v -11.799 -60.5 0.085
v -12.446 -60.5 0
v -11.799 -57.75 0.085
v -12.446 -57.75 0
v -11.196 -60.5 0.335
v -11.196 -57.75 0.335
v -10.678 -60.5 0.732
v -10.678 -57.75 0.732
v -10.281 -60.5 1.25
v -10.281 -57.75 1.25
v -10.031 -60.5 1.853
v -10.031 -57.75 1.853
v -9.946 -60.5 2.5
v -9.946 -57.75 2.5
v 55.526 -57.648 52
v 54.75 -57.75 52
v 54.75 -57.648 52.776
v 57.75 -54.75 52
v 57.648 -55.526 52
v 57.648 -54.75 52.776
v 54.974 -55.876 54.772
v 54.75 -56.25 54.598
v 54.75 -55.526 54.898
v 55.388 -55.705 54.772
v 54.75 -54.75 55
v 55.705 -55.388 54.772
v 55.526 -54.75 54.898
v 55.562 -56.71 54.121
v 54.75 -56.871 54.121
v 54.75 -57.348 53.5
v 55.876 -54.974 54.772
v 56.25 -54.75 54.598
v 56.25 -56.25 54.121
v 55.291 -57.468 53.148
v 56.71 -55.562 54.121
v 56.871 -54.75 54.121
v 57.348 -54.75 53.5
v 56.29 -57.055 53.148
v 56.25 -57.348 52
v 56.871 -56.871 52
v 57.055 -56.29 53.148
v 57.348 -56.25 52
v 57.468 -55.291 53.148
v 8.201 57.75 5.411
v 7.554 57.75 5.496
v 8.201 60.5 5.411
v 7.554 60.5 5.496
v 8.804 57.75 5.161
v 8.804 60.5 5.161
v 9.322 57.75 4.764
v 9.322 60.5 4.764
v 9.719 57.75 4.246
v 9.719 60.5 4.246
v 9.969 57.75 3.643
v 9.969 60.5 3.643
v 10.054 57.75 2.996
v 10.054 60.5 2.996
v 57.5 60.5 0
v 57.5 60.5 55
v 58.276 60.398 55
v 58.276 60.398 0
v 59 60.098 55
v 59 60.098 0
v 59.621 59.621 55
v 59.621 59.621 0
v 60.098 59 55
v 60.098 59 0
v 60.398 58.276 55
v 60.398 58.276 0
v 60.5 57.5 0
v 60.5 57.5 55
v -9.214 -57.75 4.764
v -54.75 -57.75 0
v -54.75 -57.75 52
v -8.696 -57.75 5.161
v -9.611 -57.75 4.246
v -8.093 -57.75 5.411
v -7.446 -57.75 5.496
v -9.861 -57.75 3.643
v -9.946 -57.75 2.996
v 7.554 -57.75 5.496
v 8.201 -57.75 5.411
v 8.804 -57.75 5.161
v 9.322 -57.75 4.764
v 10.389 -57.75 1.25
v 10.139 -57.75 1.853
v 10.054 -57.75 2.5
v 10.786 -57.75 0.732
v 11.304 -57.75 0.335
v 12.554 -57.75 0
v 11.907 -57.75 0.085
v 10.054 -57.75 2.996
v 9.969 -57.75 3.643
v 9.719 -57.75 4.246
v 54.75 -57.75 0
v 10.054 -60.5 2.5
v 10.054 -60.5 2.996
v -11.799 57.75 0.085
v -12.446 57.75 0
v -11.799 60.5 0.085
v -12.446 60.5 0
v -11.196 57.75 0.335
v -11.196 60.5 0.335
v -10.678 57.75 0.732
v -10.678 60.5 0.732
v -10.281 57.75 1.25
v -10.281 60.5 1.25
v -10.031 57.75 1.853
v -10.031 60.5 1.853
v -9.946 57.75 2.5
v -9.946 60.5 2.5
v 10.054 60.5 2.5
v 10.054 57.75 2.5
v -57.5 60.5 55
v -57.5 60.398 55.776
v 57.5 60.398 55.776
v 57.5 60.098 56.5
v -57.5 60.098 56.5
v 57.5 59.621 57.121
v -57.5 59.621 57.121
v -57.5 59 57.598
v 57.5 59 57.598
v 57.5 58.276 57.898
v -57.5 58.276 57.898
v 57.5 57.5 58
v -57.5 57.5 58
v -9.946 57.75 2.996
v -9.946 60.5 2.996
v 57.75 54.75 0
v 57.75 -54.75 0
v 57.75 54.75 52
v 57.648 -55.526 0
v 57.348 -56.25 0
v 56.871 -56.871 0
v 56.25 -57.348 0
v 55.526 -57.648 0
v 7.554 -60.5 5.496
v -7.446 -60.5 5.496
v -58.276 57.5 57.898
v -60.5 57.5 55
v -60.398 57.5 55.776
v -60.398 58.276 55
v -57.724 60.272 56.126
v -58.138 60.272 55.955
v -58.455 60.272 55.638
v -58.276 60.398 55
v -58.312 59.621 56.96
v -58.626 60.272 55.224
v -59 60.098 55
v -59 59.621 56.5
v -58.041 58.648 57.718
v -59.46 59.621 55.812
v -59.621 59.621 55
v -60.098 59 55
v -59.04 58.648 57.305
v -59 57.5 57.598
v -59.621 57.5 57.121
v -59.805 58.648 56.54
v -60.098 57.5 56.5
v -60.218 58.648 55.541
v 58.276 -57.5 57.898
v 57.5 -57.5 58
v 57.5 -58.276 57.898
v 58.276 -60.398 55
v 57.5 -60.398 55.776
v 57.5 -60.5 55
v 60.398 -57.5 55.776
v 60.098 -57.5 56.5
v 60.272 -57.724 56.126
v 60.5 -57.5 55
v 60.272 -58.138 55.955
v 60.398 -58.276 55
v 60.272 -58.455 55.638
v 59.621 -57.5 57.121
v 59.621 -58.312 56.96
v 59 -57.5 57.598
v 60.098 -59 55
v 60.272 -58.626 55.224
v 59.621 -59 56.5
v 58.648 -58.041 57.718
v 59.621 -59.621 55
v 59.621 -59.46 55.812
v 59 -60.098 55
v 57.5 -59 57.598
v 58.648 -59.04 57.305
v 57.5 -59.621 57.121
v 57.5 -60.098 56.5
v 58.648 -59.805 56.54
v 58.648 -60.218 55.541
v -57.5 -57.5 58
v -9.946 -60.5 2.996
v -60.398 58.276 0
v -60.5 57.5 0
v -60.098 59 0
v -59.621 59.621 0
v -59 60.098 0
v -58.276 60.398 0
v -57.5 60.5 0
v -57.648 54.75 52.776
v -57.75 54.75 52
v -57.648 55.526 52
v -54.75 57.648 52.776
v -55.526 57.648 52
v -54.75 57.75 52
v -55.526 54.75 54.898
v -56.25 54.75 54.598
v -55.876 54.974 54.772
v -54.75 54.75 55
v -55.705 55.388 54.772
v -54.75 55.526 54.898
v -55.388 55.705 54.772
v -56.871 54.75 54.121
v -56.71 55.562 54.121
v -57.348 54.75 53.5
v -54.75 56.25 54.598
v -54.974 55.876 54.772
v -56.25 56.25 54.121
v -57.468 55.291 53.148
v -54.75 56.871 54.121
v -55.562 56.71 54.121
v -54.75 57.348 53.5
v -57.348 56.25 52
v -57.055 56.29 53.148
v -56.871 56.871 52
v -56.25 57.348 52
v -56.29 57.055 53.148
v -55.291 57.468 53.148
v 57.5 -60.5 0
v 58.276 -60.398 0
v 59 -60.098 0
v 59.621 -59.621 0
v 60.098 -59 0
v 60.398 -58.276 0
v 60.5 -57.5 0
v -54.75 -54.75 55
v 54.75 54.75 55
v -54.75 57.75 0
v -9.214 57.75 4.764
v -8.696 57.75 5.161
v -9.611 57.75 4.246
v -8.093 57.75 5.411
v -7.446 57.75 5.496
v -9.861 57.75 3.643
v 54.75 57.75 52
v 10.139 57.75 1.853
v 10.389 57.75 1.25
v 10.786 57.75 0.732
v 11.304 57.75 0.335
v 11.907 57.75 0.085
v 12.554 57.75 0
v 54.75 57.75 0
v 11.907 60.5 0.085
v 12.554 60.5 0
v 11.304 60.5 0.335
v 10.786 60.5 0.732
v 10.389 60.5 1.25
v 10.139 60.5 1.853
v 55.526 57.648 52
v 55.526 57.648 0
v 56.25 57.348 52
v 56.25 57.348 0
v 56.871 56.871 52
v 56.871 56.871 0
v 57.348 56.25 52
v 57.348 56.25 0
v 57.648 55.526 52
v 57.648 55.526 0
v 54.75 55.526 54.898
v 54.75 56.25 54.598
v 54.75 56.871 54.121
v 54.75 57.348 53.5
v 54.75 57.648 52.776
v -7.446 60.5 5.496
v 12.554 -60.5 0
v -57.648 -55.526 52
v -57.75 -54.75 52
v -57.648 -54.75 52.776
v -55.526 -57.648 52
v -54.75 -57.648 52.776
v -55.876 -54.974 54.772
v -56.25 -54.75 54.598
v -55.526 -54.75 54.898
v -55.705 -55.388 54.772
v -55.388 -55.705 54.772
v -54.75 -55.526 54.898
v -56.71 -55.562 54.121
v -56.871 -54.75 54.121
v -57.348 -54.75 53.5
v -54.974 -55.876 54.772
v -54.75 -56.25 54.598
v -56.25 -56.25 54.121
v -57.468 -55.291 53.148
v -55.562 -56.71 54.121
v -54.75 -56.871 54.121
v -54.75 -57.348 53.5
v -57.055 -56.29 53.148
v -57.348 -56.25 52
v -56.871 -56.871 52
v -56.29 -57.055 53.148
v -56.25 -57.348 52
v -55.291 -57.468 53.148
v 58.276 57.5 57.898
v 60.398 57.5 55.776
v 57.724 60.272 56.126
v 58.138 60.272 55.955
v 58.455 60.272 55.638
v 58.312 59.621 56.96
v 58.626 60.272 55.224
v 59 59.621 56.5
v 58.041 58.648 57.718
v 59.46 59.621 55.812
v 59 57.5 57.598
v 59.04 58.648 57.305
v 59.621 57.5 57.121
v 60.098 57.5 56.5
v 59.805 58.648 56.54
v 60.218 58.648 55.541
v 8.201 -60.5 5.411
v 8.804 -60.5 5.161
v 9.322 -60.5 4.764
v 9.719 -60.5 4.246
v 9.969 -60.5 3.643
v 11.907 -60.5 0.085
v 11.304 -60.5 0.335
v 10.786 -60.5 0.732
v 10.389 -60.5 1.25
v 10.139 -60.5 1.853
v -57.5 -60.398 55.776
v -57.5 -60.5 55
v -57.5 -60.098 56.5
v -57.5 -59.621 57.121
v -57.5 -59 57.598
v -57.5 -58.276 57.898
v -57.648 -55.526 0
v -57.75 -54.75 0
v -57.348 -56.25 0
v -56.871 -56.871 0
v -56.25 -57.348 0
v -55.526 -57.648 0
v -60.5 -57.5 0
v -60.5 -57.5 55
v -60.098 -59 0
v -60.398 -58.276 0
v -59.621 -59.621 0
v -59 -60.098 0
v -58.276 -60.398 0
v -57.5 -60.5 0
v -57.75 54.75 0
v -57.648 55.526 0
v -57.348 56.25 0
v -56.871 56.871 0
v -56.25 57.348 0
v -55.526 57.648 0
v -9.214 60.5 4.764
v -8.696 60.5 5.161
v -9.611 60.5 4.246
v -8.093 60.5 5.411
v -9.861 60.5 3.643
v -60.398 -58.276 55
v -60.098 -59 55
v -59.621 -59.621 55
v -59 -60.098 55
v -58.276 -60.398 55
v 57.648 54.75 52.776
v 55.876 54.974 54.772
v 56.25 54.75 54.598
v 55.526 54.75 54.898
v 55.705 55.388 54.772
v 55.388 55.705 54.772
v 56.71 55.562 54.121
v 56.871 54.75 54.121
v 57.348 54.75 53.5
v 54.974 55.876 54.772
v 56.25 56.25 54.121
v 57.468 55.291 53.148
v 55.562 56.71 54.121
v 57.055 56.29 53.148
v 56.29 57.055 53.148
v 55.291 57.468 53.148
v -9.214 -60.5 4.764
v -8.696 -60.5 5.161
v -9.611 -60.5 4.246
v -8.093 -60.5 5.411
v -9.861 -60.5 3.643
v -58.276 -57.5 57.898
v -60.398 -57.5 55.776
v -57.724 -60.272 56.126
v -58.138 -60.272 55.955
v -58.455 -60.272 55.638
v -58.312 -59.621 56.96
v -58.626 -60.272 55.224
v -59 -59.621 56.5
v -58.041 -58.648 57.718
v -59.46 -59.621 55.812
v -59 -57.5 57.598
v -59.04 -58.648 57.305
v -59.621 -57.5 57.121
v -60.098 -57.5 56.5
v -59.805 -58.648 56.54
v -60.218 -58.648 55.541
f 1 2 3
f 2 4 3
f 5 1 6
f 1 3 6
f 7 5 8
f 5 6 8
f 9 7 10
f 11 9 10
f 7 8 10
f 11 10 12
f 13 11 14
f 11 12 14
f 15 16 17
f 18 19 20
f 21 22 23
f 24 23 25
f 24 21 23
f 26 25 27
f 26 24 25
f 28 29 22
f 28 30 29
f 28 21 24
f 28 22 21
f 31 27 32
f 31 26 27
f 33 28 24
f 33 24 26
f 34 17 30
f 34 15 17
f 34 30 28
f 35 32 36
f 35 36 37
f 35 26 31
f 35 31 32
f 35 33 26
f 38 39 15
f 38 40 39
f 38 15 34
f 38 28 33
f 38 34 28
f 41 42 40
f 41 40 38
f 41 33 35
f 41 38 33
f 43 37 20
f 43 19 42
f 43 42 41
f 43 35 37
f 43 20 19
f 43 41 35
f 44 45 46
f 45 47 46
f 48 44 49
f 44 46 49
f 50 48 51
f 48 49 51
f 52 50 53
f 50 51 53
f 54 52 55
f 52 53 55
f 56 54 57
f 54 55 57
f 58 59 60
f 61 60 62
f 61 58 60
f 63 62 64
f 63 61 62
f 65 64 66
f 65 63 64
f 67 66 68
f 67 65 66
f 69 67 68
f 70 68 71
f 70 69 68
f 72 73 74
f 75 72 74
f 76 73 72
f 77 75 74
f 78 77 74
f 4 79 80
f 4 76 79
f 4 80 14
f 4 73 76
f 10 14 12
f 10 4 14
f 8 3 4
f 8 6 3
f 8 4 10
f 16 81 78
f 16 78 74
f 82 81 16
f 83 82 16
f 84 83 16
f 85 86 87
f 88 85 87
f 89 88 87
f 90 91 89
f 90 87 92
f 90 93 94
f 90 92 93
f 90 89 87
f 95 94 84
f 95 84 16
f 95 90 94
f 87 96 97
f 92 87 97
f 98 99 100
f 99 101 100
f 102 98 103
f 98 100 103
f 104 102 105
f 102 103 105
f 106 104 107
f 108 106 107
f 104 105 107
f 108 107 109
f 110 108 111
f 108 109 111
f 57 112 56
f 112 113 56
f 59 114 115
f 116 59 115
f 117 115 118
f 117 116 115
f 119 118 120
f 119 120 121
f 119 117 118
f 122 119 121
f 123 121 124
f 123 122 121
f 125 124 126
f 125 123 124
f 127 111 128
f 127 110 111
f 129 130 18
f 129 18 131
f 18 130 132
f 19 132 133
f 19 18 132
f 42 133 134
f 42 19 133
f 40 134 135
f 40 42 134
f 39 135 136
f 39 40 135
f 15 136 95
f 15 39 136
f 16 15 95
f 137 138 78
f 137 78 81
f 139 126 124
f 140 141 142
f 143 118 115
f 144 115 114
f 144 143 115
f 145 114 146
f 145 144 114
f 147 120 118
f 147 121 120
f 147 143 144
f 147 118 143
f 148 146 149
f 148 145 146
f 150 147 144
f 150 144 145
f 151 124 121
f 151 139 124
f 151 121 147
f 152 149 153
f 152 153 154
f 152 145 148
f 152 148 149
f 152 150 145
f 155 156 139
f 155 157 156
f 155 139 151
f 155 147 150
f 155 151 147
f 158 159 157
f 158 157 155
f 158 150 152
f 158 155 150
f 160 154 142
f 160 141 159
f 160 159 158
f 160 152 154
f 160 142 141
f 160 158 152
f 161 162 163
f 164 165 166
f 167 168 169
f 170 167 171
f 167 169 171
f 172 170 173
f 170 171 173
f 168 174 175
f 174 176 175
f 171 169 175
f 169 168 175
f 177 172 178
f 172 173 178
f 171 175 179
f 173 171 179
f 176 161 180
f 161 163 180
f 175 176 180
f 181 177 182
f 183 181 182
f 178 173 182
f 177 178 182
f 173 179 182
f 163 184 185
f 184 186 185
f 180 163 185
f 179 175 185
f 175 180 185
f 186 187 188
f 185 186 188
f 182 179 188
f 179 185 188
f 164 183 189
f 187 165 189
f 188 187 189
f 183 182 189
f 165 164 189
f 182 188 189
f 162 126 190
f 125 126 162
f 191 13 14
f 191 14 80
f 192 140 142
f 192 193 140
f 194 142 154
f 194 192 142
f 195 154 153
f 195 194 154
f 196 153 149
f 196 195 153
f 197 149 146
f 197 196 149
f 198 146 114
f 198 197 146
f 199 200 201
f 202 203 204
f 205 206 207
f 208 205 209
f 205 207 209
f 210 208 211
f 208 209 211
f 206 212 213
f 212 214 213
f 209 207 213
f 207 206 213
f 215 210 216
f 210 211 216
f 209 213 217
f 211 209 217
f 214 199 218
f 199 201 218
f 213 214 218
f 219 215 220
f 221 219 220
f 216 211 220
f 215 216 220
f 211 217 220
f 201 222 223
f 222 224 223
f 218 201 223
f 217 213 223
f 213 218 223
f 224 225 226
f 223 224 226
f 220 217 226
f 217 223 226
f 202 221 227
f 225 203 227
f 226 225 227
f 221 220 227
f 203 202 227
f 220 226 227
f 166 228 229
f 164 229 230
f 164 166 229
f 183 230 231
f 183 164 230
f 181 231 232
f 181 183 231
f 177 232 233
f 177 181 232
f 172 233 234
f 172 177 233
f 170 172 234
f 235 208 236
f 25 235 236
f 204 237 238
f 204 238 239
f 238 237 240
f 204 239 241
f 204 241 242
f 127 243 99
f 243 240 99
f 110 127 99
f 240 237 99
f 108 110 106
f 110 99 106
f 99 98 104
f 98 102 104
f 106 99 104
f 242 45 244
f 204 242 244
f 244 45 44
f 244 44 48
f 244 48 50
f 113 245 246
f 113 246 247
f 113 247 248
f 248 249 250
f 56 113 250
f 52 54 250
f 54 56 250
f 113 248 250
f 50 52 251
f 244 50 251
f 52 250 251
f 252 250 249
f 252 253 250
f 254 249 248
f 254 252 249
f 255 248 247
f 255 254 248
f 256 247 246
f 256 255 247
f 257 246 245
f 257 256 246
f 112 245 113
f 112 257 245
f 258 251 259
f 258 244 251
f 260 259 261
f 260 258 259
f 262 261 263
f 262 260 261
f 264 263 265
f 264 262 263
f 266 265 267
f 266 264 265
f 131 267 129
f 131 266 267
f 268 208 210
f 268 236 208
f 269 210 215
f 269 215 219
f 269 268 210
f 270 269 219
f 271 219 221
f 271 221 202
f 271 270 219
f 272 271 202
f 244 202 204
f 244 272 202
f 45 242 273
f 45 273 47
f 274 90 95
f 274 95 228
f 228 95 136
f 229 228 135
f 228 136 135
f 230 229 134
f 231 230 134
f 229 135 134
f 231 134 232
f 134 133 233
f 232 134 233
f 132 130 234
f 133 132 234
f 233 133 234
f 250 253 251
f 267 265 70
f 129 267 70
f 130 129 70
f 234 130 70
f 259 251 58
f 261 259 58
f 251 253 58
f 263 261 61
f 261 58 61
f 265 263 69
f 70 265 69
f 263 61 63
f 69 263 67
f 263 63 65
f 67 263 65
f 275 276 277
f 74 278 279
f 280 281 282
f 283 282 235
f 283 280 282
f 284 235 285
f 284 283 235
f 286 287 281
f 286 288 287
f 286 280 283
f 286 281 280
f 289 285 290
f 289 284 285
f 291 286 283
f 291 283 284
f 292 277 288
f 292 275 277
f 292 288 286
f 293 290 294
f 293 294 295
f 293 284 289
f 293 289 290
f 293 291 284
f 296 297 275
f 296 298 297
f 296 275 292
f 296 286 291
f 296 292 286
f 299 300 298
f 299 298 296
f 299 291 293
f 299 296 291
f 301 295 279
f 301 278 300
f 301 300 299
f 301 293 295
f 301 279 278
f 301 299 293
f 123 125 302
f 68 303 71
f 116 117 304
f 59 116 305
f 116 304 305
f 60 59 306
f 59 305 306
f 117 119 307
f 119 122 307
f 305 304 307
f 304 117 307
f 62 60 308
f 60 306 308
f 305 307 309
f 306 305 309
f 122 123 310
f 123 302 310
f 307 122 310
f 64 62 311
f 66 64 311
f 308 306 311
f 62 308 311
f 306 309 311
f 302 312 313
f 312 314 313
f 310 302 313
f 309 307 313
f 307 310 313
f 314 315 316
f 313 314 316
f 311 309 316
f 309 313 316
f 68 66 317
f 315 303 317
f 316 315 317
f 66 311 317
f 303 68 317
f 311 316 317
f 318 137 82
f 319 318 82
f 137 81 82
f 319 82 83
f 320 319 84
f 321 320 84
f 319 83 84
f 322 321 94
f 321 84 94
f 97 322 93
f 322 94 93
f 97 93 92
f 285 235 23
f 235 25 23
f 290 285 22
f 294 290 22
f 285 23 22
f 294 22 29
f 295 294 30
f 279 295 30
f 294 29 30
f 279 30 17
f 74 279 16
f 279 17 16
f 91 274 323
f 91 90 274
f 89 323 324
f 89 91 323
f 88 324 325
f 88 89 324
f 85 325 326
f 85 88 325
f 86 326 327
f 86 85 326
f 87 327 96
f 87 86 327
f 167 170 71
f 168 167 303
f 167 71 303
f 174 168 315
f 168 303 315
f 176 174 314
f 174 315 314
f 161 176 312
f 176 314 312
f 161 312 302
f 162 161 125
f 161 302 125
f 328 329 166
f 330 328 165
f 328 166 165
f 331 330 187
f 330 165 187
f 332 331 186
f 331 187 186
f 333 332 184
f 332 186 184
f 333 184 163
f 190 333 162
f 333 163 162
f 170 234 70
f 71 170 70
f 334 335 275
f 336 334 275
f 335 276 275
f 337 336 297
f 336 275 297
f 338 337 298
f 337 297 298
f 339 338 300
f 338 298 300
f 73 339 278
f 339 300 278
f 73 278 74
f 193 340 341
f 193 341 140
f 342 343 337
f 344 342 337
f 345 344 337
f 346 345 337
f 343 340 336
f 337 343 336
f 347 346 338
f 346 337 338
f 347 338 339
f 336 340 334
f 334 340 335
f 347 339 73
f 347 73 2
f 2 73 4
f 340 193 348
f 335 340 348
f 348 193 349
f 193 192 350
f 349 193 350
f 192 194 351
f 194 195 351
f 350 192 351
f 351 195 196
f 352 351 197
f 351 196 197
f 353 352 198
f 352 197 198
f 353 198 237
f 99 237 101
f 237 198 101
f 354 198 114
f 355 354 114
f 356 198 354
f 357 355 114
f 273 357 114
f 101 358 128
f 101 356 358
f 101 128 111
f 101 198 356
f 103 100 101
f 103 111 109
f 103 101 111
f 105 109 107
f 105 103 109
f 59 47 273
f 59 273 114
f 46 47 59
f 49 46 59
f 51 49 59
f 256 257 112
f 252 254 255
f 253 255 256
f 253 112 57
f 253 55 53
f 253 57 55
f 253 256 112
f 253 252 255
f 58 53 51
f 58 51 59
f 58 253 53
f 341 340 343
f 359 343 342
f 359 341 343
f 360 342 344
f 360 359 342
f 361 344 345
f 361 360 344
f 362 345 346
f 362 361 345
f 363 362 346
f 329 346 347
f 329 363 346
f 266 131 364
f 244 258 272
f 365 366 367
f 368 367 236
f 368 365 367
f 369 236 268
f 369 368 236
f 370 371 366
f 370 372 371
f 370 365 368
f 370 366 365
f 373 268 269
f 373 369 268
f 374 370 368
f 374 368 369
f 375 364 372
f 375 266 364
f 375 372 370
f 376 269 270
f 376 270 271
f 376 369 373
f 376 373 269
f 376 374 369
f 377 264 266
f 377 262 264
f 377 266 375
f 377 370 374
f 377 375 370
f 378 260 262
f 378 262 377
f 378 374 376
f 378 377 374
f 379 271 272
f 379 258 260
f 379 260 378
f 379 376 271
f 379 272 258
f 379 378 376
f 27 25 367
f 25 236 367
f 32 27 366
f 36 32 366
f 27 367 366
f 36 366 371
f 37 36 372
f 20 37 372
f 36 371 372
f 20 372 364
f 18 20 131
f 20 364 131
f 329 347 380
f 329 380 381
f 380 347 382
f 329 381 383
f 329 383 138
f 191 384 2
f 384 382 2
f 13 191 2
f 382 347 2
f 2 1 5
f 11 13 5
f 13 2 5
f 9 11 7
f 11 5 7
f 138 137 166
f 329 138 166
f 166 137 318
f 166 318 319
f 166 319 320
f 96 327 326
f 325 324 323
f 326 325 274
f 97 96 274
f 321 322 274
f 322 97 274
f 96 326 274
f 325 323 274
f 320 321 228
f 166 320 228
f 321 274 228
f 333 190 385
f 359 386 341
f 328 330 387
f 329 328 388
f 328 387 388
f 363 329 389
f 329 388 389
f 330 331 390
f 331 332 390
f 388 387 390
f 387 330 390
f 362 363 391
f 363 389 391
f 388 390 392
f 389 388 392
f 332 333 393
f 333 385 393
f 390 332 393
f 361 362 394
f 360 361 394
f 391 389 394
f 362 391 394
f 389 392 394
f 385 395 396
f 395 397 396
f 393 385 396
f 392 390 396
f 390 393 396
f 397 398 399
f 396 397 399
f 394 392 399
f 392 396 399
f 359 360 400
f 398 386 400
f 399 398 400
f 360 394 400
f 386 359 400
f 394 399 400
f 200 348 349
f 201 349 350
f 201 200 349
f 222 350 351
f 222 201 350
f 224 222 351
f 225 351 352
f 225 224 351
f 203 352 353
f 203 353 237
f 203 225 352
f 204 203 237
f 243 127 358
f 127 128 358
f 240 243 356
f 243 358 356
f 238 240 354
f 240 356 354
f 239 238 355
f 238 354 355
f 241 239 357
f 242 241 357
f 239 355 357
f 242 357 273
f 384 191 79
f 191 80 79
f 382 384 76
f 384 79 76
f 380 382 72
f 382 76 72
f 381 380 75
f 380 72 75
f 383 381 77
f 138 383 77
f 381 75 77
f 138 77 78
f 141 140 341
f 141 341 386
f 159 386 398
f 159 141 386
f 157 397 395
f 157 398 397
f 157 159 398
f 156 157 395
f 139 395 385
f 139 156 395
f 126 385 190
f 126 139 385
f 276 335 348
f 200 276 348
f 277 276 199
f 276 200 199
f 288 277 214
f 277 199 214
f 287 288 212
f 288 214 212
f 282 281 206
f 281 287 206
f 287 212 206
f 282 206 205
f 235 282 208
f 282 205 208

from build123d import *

# Parameters (mm, degrees)
SKETCH1_W           = 121
SKETCH1_H           = 121
SKETCH1_W_2         = 115.5
SKETCH1_H_2         = 115.5
BOSS_EXTRUDE1_DEPTH = 55
SKETCH2_W           = 121
SKETCH2_H           = 121
BOSS_EXTRUDE2_DEPTH = 3
FILLET1_R           = 3
FILLET2_R           = 3
SKETCH3_W           = 20
SKETCH3_H           = 10
CUT_EXTRUDE1_DEPTH  = 177
FILLET3_R           = 2.5
FILLET4_R           = 2.5


with BuildPart() as part:
    # Sketch1 → Boss-Extrude1 (new body)
    with BuildSketch(Plane.XY):
        Rectangle(SKETCH1_W, SKETCH1_H)
        Rectangle(SKETCH1_W_2, SKETCH1_H_2, mode=Mode.SUBTRACT)
    extrude(amount=BOSS_EXTRUDE1_DEPTH)

    # Sketch2 → Boss-Extrude2 (add)
    with BuildSketch(Plane.XY.offset(55)):
        Rectangle(SKETCH2_W, SKETCH2_H)
    extrude(amount=BOSS_EXTRUDE2_DEPTH)

    # Fillet1
    fillet1_edges = [part.edges().sort_by_distance(p)[0] for p in [
        (-57.75, 57.75, 27.5),
        (-57.75, -57.75, 27.5),
        (57.75, -57.75, 27.5),
        (57.75, 57.75, 27.5),
        (-57.75, 0, 55),
        (0, -57.75, 55),
        (57.75, 0, 55),
        (0, 57.75, 55),
    ]]
    fillet(fillet1_edges, radius=FILLET1_R)

    # Fillet2
    fillet2_edges = [part.edges().sort_by_distance(p)[0] for p in [
        (-60.5, 0, 58),
        (0, -60.5, 58),
        (60.5, 0, 58),
        (0, 60.5, 58),
        (-60.5, 60.5, 29),
        (60.5, 60.5, 29),
        (60.5, -60.5, 29),
        (-60.5, -60.5, 29),
    ]]
    fillet(fillet2_edges, radius=FILLET2_R)

    # Sketch3 → Cut-Extrude1 (cut)
    with BuildSketch(Plane.XZ.offset(60.5)):
        with Locations((0.054250772, 0.496011987)):
            Rectangle(SKETCH3_W, SKETCH3_H)
    extrude(amount=-CUT_EXTRUDE1_DEPTH, mode=Mode.SUBTRACT)

    # Fillet3
    fillet3_edges = [part.edges().sort_by_distance(p)[0] for p in [
        (-9.945749228, -59.125, 0),
        (-9.945749228, -59.125, 5.496011987),
        (10.054250772, -59.125, 0),
        (10.054250772, -59.125, 5.496011987),
    ]]
    fillet(fillet3_edges, radius=FILLET3_R)

    # Fillet4
    fillet4_edges = [part.edges().sort_by_distance(p)[0] for p in [
        (-9.945749228, 59.125, 0),
        (-9.945749228, 59.125, 5.496011987),
        (10.054250772, 59.125, 0),
        (10.054250772, 59.125, 5.496011987),
    ]]
    fillet(fillet4_edges, radius=FILLET4_R)


solid = part.part
